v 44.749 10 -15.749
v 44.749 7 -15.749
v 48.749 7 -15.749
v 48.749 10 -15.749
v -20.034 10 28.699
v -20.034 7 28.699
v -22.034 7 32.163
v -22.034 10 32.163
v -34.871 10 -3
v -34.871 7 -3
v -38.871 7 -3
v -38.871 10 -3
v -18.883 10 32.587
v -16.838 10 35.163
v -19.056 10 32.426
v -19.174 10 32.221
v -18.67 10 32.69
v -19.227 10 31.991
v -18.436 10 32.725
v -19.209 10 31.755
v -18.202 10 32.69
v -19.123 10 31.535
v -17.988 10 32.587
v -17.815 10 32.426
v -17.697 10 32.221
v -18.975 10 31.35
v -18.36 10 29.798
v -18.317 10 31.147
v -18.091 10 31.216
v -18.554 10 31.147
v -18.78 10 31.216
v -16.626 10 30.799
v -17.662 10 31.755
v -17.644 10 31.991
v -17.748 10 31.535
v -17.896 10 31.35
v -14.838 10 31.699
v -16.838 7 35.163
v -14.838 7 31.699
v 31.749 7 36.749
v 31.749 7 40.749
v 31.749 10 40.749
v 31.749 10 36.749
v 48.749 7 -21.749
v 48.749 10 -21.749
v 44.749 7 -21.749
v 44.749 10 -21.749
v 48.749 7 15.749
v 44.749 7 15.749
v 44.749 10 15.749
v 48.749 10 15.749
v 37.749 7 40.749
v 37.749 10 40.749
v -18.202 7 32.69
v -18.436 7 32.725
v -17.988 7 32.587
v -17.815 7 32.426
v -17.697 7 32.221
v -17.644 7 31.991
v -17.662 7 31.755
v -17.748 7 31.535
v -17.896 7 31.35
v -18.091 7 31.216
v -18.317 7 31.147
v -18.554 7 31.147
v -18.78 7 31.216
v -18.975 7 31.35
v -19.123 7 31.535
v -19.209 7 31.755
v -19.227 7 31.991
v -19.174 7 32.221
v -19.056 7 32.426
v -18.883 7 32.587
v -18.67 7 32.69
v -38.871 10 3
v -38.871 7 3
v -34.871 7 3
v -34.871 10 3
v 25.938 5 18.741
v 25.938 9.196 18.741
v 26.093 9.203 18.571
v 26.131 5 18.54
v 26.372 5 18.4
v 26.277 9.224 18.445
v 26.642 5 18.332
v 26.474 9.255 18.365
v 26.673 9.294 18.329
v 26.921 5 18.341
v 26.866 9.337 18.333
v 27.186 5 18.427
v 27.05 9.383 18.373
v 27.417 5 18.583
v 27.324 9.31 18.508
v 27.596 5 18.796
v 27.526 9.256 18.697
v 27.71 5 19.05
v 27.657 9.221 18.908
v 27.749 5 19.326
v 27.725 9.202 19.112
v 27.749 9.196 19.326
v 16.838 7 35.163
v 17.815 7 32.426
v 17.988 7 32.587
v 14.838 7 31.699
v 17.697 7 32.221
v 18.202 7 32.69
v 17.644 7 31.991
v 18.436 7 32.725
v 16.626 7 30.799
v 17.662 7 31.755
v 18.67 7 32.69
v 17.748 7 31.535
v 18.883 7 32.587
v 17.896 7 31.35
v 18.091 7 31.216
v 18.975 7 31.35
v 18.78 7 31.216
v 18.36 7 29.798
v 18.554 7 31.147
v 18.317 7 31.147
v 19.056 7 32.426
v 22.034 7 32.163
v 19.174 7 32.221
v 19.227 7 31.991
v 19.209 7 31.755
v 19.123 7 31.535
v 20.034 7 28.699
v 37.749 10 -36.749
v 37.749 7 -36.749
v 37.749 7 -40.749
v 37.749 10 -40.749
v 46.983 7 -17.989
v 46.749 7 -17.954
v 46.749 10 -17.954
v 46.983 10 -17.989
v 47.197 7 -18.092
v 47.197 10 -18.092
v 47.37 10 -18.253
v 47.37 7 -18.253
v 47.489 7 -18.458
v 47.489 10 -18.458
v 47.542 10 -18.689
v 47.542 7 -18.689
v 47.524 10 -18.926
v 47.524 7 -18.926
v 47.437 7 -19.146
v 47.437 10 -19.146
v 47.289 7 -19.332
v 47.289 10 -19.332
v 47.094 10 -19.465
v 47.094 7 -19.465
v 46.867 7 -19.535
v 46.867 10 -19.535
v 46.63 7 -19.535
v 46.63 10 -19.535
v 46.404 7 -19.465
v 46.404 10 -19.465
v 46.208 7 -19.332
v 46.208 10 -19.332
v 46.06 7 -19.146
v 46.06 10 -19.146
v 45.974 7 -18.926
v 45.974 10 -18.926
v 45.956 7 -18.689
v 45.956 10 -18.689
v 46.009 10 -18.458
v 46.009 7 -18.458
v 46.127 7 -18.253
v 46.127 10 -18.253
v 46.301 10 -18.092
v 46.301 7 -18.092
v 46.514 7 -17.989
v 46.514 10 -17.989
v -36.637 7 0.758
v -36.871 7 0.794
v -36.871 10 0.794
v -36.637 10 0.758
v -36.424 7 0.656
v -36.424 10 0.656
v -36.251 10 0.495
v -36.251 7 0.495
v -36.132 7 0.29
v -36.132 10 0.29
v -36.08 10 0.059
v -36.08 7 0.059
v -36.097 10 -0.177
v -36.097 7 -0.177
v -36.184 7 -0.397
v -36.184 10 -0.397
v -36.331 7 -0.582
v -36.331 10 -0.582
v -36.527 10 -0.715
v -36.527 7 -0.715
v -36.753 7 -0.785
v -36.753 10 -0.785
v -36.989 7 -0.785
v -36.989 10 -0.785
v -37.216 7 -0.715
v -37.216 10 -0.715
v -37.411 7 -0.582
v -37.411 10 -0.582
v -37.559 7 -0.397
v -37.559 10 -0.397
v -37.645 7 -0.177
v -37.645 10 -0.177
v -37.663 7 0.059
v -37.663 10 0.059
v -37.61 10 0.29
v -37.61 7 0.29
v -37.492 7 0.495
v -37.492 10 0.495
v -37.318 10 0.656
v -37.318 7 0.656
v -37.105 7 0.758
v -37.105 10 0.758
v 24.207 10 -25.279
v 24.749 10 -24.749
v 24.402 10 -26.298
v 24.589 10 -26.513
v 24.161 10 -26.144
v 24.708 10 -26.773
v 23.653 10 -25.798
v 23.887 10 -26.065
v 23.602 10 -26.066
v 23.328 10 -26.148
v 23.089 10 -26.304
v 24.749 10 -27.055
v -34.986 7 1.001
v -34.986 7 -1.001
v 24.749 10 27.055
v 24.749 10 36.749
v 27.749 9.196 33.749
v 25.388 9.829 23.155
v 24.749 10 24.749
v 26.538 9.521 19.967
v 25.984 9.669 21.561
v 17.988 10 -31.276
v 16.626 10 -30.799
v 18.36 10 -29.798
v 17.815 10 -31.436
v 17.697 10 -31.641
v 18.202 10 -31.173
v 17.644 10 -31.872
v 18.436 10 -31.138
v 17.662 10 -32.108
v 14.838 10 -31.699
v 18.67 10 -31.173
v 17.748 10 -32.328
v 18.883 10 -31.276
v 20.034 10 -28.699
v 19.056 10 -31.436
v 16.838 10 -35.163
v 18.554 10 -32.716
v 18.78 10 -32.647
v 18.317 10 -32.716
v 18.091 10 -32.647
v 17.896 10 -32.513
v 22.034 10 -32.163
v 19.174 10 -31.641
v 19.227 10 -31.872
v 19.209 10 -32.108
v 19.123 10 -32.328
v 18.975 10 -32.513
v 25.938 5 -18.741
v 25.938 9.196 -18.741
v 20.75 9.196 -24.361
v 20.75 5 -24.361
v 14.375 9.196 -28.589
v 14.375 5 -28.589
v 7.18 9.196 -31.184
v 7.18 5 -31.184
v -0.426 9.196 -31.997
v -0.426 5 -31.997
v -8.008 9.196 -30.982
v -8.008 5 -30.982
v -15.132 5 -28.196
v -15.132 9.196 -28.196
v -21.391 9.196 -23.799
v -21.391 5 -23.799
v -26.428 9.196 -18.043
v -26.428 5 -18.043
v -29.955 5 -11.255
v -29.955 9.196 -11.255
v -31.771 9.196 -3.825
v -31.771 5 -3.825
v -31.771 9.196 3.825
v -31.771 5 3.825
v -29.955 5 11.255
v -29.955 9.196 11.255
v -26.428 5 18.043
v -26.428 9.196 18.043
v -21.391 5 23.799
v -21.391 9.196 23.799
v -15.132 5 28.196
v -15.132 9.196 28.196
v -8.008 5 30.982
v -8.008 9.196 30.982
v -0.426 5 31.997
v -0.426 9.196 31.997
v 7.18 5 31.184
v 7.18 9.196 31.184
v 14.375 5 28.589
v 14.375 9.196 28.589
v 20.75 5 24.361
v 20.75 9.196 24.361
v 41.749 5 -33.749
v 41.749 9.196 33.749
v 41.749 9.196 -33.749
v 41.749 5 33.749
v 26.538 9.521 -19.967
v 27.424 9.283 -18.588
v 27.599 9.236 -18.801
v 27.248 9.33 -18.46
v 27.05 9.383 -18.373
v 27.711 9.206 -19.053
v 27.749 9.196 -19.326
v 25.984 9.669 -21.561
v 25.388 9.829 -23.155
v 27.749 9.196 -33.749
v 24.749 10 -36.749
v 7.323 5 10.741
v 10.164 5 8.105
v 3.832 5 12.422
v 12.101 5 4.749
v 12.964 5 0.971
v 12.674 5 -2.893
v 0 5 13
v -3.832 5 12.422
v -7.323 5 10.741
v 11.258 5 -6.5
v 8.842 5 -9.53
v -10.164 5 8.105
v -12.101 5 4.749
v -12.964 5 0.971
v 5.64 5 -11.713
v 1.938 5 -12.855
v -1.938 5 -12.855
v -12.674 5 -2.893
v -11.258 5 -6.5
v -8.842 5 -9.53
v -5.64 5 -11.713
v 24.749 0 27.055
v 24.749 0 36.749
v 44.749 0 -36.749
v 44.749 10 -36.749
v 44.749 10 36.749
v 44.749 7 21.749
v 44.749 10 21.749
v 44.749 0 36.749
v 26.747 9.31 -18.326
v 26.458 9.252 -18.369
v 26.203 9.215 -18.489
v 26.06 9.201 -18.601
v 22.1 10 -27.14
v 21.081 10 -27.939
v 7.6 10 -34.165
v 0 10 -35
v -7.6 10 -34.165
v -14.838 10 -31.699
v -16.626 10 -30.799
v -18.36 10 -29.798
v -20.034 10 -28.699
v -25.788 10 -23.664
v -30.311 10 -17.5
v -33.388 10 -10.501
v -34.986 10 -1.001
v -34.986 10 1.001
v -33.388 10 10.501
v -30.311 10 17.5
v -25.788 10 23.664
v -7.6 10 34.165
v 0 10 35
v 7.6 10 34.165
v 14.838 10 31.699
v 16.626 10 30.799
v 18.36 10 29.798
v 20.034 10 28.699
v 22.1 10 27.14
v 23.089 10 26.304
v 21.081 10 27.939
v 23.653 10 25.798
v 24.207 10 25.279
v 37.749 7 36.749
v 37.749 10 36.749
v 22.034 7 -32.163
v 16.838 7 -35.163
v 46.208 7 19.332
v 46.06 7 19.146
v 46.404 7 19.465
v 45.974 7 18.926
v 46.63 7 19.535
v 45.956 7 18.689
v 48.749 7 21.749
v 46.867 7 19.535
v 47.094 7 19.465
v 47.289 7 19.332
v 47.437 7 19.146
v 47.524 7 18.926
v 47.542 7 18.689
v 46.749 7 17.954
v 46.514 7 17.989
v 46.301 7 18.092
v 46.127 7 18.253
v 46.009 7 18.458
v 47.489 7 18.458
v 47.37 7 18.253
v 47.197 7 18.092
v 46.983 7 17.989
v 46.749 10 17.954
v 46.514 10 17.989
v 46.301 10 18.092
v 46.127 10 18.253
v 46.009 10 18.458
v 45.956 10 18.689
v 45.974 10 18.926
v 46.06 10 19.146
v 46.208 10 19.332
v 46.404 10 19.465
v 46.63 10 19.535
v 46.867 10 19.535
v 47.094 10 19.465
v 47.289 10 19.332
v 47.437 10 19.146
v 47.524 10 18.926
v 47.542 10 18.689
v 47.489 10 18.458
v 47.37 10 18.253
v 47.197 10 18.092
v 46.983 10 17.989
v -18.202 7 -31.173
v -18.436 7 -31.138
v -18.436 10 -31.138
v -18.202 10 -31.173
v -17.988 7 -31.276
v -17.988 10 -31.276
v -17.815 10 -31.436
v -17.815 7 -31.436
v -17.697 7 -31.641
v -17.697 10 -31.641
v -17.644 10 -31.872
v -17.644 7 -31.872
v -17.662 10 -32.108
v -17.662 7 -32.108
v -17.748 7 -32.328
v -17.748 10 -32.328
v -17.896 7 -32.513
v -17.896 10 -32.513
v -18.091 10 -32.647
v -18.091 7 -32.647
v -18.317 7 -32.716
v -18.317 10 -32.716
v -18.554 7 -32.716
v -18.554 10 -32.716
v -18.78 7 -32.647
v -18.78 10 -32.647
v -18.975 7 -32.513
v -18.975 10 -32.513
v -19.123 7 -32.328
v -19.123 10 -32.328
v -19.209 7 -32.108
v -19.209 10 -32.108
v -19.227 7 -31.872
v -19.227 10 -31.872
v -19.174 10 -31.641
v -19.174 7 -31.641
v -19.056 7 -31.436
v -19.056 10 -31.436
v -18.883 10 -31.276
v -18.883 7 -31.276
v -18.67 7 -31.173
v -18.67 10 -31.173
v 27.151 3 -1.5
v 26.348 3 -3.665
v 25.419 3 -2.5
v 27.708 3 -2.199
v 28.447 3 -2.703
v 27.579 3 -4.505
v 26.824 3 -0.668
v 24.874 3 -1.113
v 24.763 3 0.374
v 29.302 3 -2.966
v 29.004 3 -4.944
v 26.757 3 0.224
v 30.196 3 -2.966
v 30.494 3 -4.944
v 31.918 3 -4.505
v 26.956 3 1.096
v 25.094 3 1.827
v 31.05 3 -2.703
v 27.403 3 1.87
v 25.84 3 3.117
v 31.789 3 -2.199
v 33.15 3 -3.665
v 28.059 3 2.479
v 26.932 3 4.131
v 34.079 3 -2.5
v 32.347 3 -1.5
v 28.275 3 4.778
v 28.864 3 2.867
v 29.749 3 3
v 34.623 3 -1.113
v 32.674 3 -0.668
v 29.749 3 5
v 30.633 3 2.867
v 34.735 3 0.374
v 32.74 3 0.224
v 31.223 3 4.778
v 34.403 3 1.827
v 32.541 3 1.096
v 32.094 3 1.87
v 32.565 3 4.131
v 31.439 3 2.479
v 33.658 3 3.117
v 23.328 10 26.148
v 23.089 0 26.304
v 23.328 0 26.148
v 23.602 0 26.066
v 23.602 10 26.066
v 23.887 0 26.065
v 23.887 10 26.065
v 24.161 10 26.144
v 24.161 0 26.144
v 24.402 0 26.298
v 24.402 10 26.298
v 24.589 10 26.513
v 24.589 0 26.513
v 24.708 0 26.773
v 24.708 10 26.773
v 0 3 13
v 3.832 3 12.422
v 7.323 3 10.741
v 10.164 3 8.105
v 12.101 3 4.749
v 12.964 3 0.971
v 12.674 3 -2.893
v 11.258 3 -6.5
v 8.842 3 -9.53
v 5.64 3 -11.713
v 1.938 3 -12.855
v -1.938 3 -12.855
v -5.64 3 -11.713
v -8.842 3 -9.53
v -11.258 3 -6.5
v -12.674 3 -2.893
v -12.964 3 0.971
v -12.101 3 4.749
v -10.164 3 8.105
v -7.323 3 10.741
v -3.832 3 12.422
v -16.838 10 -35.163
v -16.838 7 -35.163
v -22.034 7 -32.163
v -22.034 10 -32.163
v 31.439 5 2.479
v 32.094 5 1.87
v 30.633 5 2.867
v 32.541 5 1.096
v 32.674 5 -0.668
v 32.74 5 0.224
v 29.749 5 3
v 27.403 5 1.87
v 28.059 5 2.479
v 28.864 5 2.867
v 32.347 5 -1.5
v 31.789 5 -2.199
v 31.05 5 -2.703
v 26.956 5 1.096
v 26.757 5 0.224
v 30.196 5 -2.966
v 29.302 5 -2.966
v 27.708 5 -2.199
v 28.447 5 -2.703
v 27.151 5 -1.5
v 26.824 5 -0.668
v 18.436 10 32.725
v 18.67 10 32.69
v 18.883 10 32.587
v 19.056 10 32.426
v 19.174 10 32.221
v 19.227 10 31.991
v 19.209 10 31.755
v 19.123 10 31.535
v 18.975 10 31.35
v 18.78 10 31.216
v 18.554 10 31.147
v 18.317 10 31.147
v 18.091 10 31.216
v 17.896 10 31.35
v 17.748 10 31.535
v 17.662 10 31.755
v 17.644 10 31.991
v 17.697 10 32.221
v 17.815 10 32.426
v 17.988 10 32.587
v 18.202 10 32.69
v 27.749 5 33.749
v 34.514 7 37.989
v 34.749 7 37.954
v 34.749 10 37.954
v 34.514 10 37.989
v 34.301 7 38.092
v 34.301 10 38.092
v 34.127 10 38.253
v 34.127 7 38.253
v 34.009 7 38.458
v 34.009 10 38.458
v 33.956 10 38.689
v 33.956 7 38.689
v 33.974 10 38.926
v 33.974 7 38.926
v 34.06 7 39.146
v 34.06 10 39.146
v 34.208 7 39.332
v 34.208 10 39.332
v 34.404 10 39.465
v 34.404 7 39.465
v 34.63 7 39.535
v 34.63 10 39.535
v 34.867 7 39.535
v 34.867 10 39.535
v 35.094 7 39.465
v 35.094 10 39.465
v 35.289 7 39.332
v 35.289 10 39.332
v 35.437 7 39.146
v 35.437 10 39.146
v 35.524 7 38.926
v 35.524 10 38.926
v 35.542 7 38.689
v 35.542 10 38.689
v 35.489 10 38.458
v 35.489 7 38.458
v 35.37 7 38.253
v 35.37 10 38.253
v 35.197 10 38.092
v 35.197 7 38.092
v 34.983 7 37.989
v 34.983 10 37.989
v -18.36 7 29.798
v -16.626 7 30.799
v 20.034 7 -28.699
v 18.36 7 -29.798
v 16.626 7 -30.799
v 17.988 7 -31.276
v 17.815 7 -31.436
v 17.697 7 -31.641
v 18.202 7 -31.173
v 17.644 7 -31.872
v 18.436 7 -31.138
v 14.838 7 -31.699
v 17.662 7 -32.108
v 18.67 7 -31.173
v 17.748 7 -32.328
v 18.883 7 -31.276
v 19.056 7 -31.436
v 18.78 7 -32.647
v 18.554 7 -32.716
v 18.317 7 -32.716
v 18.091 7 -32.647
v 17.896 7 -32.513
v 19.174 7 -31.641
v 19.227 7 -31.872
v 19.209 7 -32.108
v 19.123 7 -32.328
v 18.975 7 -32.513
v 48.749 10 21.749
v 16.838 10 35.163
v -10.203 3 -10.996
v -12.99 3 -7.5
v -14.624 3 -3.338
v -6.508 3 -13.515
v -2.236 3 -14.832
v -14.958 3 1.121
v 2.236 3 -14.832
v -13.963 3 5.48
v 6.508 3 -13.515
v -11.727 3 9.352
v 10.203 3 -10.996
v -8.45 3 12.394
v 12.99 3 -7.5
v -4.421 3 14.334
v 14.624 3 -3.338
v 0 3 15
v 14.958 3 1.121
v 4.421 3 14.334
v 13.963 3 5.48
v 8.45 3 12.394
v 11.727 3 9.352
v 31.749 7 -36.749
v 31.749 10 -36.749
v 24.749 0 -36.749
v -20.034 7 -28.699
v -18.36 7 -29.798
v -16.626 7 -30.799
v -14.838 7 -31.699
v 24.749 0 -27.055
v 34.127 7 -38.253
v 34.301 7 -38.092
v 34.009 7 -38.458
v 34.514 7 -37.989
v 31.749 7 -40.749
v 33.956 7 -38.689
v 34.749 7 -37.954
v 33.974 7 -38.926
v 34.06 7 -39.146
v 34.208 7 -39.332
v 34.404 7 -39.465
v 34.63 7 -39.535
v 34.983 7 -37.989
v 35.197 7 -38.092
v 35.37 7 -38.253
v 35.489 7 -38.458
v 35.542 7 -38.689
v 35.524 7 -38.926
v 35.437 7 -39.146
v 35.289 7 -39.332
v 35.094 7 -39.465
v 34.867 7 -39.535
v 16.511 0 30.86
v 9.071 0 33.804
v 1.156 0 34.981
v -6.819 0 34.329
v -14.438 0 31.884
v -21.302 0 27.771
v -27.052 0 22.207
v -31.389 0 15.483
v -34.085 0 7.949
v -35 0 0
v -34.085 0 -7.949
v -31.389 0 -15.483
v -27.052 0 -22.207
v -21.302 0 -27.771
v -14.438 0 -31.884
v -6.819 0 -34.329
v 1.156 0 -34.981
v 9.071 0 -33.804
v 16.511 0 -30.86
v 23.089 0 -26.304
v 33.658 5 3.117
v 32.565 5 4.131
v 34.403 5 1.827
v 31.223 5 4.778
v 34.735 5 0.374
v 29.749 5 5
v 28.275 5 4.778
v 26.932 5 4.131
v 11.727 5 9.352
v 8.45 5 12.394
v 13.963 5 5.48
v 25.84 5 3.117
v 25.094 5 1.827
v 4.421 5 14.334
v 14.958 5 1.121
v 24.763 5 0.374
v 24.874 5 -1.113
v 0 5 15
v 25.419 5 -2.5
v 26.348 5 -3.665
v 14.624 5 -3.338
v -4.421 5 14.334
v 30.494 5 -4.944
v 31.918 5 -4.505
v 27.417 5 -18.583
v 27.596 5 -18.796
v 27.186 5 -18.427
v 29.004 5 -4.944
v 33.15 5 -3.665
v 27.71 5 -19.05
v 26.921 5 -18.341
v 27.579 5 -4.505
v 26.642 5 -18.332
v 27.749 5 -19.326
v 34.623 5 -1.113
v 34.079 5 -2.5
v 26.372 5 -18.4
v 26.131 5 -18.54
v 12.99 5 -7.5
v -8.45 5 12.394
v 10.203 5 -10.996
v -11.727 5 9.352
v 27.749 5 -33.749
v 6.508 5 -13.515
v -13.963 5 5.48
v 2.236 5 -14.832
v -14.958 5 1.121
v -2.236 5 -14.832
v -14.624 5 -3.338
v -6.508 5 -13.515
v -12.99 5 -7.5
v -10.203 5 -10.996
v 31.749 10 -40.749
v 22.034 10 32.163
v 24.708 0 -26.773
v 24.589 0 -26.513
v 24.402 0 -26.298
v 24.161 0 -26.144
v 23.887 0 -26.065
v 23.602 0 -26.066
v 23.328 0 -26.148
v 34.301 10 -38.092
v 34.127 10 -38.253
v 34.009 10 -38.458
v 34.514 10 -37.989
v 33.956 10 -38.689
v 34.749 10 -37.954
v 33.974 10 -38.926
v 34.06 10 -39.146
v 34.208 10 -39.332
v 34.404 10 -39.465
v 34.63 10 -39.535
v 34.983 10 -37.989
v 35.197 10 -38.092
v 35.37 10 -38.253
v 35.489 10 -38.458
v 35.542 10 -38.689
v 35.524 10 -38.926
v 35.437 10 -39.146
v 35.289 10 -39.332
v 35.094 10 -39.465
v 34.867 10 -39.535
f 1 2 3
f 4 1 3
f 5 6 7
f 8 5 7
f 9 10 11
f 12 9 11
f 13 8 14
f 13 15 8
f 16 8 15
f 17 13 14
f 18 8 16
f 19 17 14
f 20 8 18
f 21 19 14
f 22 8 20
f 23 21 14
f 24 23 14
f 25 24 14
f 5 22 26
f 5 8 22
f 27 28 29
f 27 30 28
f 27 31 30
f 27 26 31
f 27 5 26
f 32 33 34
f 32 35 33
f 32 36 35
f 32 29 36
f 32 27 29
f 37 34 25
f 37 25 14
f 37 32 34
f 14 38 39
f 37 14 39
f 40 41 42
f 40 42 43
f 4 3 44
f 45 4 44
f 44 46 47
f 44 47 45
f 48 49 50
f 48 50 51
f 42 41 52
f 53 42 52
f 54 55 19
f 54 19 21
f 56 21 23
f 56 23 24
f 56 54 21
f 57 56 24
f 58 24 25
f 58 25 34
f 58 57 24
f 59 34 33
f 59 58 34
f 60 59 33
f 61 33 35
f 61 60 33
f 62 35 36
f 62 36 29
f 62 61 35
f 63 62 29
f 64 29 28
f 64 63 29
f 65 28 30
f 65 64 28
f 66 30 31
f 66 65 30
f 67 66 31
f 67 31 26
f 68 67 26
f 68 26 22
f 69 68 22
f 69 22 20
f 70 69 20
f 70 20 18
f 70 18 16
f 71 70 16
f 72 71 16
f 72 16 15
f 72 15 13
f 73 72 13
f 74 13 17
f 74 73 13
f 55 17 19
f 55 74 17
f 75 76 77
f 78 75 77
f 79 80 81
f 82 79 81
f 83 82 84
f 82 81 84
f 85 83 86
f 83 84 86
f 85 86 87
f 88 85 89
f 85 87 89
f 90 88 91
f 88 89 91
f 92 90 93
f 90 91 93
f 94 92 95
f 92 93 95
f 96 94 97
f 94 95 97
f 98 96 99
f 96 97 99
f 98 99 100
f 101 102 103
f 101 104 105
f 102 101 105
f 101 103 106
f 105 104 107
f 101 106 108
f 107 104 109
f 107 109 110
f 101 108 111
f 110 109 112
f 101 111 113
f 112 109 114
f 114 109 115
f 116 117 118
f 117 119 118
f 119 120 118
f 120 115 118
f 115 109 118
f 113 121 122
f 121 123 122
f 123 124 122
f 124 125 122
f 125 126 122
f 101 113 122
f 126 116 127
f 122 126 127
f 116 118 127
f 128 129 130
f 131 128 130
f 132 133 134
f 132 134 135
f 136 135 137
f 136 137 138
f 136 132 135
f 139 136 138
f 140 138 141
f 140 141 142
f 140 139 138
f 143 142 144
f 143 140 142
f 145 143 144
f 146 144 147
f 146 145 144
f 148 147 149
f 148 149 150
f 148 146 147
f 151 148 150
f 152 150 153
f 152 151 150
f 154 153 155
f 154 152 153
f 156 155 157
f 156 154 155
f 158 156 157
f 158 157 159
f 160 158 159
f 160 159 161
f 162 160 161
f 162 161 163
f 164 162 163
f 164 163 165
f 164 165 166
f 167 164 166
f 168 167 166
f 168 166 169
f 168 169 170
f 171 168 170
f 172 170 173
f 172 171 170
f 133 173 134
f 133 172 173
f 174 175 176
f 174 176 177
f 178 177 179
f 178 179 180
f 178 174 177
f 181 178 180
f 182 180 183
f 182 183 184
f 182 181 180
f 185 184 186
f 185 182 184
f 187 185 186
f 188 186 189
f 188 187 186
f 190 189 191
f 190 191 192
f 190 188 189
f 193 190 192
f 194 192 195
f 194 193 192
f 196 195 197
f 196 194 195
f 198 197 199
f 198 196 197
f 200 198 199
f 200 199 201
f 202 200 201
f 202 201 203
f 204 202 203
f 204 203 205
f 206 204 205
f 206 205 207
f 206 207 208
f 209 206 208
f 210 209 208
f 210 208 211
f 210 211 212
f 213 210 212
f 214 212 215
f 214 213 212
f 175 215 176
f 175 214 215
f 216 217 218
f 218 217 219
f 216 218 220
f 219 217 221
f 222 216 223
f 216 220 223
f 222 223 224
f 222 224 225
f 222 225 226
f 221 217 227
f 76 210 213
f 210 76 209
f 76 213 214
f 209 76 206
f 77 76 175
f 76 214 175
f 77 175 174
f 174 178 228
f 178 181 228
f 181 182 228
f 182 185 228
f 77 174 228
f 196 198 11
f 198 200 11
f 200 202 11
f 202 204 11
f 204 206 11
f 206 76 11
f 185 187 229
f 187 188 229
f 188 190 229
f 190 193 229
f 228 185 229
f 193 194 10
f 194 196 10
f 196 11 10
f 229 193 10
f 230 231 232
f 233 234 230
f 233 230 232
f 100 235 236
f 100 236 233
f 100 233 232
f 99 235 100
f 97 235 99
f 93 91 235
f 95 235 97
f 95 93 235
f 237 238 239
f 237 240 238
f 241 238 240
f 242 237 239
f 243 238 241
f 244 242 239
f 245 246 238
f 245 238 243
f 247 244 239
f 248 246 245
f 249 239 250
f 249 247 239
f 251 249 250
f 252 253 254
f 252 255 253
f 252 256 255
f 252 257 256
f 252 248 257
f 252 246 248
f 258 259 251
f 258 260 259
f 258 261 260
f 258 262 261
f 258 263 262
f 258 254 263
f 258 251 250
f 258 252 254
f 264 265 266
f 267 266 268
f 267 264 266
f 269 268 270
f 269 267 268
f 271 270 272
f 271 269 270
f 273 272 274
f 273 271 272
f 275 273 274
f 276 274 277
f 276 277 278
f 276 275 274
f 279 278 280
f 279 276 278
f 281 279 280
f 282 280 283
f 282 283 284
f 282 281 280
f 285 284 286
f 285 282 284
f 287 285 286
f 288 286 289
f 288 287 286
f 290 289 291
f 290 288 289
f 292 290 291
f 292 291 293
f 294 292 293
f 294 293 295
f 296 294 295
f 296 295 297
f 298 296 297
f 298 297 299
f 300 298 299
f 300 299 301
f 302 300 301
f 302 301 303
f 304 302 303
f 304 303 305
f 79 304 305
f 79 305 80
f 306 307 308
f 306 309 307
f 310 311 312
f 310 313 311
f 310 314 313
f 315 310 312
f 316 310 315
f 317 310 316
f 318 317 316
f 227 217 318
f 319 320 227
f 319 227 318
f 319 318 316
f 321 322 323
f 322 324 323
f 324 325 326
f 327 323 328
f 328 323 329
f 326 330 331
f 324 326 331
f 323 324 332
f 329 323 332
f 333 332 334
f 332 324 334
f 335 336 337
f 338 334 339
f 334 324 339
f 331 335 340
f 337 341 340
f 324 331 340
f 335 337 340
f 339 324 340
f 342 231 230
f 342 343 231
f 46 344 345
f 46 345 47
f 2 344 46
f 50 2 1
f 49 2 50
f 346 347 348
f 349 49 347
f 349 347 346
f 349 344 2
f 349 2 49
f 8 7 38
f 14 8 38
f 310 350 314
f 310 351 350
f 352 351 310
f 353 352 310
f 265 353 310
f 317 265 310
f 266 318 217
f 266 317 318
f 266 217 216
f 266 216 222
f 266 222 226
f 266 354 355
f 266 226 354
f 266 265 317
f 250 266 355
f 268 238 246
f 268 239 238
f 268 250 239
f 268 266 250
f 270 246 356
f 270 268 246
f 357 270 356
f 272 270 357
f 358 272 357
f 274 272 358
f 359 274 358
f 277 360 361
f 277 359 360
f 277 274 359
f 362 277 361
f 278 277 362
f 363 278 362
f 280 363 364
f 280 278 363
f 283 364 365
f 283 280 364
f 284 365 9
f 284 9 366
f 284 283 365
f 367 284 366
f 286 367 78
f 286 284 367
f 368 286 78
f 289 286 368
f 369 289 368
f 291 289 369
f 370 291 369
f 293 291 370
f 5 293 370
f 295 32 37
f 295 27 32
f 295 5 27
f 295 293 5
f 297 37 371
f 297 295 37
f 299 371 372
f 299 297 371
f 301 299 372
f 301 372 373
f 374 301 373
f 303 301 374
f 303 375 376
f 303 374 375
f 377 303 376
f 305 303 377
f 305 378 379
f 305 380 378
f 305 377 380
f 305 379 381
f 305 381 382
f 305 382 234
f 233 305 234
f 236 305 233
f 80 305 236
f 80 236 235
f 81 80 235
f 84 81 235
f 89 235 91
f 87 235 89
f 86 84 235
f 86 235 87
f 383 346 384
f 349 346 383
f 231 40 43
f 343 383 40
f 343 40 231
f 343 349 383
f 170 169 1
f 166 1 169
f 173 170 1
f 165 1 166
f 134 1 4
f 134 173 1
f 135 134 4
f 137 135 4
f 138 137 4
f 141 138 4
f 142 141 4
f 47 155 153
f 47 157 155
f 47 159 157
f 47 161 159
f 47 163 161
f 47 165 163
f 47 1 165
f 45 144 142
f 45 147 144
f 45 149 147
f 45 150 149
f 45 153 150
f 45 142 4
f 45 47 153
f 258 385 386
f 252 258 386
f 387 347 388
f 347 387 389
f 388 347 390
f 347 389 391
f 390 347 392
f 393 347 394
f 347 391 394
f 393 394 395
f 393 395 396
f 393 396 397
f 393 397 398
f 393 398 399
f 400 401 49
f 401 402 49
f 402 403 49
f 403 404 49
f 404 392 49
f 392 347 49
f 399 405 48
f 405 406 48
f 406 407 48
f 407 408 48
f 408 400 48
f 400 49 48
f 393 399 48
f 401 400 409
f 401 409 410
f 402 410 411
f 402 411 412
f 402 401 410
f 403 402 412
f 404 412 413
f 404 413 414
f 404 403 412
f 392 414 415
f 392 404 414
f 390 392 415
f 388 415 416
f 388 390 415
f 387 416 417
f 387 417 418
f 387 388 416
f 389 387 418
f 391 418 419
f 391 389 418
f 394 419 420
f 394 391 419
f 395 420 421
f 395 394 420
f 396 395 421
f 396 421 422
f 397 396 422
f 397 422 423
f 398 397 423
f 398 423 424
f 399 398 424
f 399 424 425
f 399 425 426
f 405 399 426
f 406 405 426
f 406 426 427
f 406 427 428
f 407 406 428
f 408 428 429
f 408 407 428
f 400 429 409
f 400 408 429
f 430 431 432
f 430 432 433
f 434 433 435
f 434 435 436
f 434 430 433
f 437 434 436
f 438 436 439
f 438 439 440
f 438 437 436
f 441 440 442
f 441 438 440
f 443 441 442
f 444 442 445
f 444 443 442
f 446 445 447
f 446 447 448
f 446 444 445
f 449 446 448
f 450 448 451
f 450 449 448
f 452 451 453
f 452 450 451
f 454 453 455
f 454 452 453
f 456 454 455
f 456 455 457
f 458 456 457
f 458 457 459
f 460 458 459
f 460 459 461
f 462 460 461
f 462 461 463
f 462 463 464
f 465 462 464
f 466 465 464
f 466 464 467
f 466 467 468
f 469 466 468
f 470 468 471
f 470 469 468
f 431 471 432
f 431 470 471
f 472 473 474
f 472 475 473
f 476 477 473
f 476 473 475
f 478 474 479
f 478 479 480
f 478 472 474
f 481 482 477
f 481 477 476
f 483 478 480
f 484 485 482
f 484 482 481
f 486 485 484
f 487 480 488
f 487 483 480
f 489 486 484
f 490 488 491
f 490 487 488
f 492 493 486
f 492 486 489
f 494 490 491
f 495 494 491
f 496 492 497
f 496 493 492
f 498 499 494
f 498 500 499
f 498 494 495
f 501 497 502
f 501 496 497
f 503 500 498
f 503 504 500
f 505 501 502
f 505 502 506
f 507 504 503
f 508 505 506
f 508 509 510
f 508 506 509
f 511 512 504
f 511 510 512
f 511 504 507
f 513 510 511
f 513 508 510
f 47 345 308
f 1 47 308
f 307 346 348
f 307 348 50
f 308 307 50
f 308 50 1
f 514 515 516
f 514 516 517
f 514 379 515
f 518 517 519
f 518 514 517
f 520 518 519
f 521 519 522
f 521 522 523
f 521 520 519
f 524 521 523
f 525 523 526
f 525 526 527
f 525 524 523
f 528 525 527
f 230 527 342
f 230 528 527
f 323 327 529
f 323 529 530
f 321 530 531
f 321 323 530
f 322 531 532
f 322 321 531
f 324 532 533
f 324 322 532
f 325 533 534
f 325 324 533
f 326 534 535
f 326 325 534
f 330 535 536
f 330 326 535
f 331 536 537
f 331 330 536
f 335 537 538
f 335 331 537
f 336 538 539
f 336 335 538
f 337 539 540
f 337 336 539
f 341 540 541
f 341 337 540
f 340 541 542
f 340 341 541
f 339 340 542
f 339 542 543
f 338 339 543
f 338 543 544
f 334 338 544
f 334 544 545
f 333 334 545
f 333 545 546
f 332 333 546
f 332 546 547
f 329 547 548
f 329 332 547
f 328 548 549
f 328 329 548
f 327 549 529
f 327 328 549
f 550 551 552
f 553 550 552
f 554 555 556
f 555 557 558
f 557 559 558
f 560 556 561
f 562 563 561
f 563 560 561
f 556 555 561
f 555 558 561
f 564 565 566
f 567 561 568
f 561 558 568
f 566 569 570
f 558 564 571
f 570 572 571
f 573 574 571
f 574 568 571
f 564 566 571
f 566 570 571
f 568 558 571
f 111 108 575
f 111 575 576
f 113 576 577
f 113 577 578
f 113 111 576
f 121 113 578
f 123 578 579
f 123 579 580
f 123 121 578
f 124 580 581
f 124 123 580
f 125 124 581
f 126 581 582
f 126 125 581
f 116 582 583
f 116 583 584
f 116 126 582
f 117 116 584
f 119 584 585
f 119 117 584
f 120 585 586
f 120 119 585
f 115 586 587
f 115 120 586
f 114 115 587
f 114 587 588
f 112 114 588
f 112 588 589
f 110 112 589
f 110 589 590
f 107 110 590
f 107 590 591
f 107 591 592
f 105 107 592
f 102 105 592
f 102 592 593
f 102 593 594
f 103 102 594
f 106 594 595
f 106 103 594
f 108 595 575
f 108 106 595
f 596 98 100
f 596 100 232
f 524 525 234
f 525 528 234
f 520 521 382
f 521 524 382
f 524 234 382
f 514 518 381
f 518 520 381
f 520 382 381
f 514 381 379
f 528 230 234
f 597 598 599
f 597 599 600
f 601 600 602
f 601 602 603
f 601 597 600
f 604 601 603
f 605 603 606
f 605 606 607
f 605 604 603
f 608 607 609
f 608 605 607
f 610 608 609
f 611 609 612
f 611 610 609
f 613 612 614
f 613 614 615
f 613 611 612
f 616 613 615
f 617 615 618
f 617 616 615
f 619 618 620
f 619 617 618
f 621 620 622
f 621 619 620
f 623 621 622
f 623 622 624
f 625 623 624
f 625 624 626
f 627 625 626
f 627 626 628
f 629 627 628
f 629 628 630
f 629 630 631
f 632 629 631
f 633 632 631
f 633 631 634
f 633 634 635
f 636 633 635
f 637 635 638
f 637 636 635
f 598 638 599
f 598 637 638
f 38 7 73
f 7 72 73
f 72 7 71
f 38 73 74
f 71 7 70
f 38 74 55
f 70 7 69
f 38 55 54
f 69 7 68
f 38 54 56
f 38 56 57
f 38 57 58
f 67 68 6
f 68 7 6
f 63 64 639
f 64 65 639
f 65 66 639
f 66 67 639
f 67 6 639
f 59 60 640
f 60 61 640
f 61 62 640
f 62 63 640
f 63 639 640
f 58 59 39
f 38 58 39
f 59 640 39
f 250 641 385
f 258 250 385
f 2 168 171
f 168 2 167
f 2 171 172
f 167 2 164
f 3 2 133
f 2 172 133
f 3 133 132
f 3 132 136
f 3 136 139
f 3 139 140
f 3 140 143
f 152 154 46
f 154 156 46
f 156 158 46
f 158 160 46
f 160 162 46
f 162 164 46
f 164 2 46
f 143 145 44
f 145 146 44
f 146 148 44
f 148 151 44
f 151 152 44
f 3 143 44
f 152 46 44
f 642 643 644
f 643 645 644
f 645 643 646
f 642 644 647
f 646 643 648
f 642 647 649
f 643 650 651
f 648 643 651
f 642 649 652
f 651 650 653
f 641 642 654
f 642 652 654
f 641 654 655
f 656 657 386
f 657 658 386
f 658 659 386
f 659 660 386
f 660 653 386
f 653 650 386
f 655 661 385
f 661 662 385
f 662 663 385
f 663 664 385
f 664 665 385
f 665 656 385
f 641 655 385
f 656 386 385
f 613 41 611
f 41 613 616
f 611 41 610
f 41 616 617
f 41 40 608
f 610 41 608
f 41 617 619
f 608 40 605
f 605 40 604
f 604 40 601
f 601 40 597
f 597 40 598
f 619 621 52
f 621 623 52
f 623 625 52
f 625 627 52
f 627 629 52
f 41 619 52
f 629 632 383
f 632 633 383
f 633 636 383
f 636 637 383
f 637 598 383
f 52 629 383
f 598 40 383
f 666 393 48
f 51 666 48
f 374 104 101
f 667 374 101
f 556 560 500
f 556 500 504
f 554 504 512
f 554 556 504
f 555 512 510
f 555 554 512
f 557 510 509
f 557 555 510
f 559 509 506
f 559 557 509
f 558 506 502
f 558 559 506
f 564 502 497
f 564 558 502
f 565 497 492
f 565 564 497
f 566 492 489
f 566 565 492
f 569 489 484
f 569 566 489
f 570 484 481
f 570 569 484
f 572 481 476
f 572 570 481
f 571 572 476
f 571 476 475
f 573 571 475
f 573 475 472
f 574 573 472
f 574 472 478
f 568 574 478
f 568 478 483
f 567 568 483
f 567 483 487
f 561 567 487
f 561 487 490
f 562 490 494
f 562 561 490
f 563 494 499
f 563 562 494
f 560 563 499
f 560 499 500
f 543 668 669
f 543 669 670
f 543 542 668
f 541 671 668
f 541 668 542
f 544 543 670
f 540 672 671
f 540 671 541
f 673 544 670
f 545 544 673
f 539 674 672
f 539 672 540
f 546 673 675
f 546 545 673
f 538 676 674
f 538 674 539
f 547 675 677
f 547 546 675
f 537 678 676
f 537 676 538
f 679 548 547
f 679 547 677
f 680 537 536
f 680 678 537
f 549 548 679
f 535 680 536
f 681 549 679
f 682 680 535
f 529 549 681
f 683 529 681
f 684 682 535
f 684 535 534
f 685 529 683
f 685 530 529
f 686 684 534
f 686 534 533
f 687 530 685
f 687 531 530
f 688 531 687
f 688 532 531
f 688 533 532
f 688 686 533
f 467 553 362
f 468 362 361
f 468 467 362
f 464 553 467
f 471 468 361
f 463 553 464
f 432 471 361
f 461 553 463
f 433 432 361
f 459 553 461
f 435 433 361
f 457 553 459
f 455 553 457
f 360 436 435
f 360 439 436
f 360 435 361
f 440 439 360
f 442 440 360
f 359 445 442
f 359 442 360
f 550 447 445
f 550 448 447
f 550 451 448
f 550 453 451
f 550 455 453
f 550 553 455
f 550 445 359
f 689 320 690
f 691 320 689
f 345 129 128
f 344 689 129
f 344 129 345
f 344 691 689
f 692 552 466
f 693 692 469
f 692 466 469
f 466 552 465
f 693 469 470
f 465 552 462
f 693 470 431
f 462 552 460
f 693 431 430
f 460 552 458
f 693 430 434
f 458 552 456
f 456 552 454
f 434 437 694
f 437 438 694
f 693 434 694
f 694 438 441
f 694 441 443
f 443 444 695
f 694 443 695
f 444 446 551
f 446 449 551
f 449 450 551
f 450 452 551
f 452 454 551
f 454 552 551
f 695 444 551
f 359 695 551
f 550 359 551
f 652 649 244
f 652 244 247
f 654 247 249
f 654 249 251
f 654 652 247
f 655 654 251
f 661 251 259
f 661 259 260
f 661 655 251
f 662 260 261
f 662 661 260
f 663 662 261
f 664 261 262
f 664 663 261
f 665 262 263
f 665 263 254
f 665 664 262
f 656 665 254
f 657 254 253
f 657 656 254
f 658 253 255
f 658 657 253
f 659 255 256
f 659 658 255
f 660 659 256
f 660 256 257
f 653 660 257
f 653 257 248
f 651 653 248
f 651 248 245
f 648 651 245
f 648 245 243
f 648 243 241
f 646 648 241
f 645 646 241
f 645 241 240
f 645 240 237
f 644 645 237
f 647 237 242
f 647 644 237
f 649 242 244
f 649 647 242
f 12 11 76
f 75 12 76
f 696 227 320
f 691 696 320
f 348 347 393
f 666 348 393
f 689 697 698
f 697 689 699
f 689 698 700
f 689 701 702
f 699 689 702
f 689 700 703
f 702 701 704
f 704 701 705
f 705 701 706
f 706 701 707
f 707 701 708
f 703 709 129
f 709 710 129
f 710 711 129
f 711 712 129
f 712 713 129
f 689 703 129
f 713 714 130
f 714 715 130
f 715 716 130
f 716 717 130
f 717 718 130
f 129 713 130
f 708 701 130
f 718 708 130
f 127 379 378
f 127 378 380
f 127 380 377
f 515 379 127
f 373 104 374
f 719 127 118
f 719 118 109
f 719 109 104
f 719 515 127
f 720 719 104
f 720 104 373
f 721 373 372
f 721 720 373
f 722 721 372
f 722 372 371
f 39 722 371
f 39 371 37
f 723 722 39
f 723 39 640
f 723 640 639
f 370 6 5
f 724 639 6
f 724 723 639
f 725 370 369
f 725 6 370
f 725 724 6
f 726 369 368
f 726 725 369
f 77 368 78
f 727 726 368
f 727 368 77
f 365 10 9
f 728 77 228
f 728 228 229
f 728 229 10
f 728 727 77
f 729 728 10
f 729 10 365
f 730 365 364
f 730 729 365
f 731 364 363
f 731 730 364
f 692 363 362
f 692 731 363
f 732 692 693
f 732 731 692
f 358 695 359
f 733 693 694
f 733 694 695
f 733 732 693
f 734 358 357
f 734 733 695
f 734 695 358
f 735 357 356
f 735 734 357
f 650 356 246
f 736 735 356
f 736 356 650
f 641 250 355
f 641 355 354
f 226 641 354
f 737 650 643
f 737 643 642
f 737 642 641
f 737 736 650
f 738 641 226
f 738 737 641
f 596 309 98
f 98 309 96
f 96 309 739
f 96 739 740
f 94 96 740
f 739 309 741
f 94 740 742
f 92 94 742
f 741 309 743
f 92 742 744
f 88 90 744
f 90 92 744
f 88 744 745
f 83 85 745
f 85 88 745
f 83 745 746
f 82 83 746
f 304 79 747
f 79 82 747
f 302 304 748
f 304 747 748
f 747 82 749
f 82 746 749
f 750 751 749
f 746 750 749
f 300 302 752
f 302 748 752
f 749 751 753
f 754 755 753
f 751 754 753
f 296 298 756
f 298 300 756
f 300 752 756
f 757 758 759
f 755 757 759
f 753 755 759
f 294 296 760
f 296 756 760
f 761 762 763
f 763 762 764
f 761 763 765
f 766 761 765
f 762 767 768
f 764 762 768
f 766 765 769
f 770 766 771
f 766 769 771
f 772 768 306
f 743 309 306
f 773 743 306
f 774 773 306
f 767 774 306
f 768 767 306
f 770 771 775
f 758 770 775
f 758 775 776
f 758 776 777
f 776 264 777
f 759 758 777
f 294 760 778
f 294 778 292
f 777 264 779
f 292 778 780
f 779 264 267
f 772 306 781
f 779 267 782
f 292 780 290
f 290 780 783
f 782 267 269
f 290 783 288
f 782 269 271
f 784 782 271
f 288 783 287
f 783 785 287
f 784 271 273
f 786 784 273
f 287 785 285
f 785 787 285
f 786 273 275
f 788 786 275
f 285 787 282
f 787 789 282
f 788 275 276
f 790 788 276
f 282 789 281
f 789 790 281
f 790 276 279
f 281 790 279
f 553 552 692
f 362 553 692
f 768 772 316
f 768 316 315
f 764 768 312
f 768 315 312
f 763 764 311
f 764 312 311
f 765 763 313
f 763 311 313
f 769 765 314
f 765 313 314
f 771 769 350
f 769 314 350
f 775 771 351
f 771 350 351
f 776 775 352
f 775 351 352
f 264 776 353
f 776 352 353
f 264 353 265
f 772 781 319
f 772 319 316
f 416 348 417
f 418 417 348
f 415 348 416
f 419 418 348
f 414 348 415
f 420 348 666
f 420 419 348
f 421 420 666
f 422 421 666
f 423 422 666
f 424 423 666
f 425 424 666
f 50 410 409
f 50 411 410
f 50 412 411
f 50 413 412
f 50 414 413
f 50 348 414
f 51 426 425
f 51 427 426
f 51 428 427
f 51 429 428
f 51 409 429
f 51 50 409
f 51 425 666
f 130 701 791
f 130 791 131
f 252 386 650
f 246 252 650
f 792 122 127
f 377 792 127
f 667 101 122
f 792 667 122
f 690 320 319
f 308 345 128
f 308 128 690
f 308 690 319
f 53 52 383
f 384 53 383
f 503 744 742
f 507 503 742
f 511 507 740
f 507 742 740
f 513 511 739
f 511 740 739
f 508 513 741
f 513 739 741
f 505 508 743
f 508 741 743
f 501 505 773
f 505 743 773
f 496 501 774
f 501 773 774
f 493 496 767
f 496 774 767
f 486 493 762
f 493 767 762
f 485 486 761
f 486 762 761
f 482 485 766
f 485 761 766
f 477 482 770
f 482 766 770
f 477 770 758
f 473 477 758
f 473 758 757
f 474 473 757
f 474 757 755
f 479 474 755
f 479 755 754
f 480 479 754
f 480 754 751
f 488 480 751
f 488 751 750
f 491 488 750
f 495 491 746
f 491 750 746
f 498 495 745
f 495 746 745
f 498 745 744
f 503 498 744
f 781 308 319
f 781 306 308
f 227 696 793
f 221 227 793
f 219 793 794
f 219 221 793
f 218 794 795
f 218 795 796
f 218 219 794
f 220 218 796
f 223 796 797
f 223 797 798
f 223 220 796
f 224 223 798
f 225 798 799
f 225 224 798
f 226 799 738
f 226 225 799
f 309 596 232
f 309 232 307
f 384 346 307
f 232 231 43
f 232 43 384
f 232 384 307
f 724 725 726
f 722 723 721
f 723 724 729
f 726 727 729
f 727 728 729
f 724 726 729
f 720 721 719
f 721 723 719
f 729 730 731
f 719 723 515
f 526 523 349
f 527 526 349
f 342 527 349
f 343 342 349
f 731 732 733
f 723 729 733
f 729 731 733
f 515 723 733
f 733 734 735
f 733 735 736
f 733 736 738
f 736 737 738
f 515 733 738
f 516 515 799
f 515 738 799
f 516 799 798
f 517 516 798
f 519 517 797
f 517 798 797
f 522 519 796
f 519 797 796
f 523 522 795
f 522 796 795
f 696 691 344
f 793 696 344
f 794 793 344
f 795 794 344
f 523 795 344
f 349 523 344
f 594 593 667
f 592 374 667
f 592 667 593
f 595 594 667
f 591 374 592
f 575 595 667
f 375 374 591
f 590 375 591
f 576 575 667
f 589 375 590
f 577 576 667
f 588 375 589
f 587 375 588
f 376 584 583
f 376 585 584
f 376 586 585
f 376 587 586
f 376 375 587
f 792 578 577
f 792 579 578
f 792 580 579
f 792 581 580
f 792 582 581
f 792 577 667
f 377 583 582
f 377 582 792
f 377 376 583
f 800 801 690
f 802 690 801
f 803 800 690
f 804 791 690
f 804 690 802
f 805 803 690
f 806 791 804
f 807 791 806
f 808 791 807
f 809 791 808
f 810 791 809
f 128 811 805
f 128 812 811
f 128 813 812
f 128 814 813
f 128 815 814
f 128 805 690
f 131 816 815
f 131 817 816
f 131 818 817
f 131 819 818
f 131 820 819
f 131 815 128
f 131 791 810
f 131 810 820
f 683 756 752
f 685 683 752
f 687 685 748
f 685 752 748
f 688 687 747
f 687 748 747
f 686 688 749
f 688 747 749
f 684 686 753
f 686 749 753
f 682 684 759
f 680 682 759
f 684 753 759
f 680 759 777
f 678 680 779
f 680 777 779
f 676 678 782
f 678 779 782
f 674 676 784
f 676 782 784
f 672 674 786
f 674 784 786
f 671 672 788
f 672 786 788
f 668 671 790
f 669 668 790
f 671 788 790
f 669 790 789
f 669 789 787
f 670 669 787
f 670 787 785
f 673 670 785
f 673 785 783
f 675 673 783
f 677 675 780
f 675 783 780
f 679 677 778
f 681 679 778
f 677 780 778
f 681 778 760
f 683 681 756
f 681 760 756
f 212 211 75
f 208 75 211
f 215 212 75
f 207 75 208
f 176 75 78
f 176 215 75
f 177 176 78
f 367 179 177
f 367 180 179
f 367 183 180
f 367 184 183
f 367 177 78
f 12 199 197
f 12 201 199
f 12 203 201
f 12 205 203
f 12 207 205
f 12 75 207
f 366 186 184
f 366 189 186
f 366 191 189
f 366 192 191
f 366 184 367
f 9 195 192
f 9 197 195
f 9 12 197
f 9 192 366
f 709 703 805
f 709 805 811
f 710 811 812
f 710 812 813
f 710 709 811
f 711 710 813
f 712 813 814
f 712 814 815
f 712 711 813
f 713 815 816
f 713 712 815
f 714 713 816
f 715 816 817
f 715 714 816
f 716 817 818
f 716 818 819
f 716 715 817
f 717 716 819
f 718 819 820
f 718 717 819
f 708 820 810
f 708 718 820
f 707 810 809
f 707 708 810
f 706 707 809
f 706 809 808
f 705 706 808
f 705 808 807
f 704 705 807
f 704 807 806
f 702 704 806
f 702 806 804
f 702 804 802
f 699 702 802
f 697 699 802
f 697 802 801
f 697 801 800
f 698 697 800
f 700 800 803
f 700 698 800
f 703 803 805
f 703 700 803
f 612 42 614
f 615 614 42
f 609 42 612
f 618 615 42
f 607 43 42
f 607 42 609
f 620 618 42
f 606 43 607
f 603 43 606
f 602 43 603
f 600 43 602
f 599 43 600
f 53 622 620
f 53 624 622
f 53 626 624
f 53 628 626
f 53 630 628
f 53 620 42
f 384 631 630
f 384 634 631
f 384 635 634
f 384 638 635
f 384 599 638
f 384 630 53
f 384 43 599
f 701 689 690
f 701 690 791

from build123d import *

# Parameters (mm, degrees)
SKETCH1_R           = 15
BOSS_EXTRUDE1_DEPTH = 5
BOSS_EXTRUDE2_DEPTH = 5
FILLET2_R           = 1
CHAMFER12_SIZE      = 3
CHAMFER12_SIZE_2    = 0.803847577
BOSS_EXTRUDE3_START = -3
SKETCH5_R           = 0.79375
SKETCH5_W           = 6
SKETCH5_H           = 4
SKETCH5_R_2         = 0.795
SKETCH5_W_2         = 4
SKETCH5_H_2         = 6
BOSS_EXTRUDE3_DEPTH = 3
FILLET3_R           = 1
BOSS_EXTRUDE4_START = -5
SKETCH6_R           = 15
BOSS_EXTRUDE4_DEPTH = 5
SKETCH7_R           = 15
SKETCH7_R_2         = 13
SKETCH7_R_3         = 5
SKETCH7_R_4         = 3
CUT_EXTRUDE1_DEPTH  = 2


with BuildPart() as part:
    # Sketch1 → Boss-Extrude1 (new body)
    with BuildSketch(Plane(origin=(0, 0, 0), x_dir=(1, 0, 0), z_dir=(0, 1, 0))):
        with BuildLine():
            Line((24.748737342, 24.748737342), (24.748737342, 36.748737342))
            Line((24.748737342, 36.748737342), (44.748737342, 36.748737342))
            Line((44.748737342, 36.748737342), (44.748737342, -36.748737342))
            Line((44.748737342, -36.748737342), (24.748737342, -36.748737342))
            Line((24.748737342, -36.748737342), (24.748737342, -24.748737342))
            ThreePointArc((24.748737342, -24.748737342), (-35, 0), (24.748737342, 24.748737342))
        make_face()
        with Locations(Location((0, 0, 0), (0, 0, 270))):
            Circle(SKETCH1_R, mode=Mode.SUBTRACT)
    extrude(amount=BOSS_EXTRUDE1_DEPTH)

    # Sketch2 → Boss-Extrude2 (add)
    with BuildSketch(Plane(origin=(0, 5, 0), x_dir=(1, 0, 0), z_dir=(0, 1, 0))):
        with BuildLine():
            Line((24.748737342, 24.748737342), (24.748737342, 36.748737342))
            Line((24.748737342, 36.748737342), (44.748737342, 36.748737342))
            Line((44.748737342, 36.748737342), (44.748737342, -36.748737342))
            Line((44.748737342, -36.748737342), (24.748737342, -36.748737342))
            Line((24.748737342, -36.748737342), (24.748737342, -24.748737342))
            ThreePointArc((24.748737342, -24.748737342), (-35, 0), (24.748737342, 24.748737342))
        make_face()
        with BuildLine():
            Line((27.748737342, -15.937615127), (27.748737342, -33.748737342))
            Line((27.748737342, -33.748737342), (41.748737342, -33.748737342))
            Line((41.748737342, -33.748737342), (41.748737342, 33.748737342))
            Line((41.748737342, 33.748737342), (27.748737342, 33.748737342))
            Line((27.748737342, 33.748737342), (27.748737342, 15.937615127))
            ThreePointArc((27.748737342, 15.937615127), (-32, 0), (27.748737342, -15.937615127))
        make_face(mode=Mode.SUBTRACT)
    extrude(amount=BOSS_EXTRUDE2_DEPTH)

    # Fillet2
    fillet2_edges = [part.edges().sort_by_distance(p)[0] for p in [
        (24.748737342, 5, -24.748737342),
        (24.748737342, 5, 24.748737342),
    ]]
    fillet(fillet2_edges, radius=FILLET2_R)

    # Chamfer12
    # the kernel refuses this chamfer: 3, 0.803847577 mm, written as the material it takes off along each edge
    with BuildSketch(Plane(origin=(0, 10, 0), x_dir=(0.9619307815124764, 0, -0.27329319709571387), z_dir=(0.27329319709571387, 0, 0.9619307815124764))) as chamfer12_piece_1:
        Polygon((32 + CHAMFER12_SIZE, 0), (32, -CHAMFER12_SIZE_2), (32, 0), align=None)
    revolve(axis=Axis((0, 10, 0), (0, 1, 0)), revolution_arc=328.279348711, mode=Mode.SUBTRACT)
    with BuildSketch(Plane(origin=(27.748737342, 10, 8.147450417), x_dir=(-1, 0, 0), z_dir=(0, 0, 1)), Plane(origin=(27.748737342, 10, -33.748737342), x_dir=(-1, 0, 0), z_dir=(0, 0, 1))) as chamfer12_piece_2:
        Polygon((CHAMFER12_SIZE, 0), (0, CHAMFER12_SIZE_2), (0, 0), align=None)
    extrude(amount=25.601286925, mode=Mode.SUBTRACT)
    with BuildSketch(Plane(origin=(27.748737342, 10, 33.748737342), x_dir=(0, 0, 1), z_dir=(1, 0, 0)), Plane(origin=(41.748737342, 10, -33.748737342), x_dir=(0, 0, -1), z_dir=(-1, 0, 0))) as chamfer12_piece_3:
        Polygon((CHAMFER12_SIZE, 0), (0, CHAMFER12_SIZE_2), (0, 0), align=None)
    extrude(amount=14, mode=Mode.SUBTRACT)
    with BuildSketch(Plane(origin=(41.748737342, 10, 33.748737342), x_dir=(1, 0, 0), z_dir=(0, 0, -1))) as chamfer12_piece_4:
        Polygon((CHAMFER12_SIZE, 0), (0, CHAMFER12_SIZE_2), (0, 0), align=None)
    extrude(amount=67.497474683, mode=Mode.SUBTRACT)
    with BuildSketch(Plane(origin=(27.748737342, 10, 8.147450417), x_dir=(-1, 0, 0), z_dir=(0, 0, 1))) as chamfer12_piece_5a_section:
        Polygon((CHAMFER12_SIZE, 0), (0, CHAMFER12_SIZE_2), (0, 0), align=None)
    chamfer12_piece_5a = extrude(amount=33.391451635, mode=Mode.PRIVATE)
    chamfer12_piece_5a = split(chamfer12_piece_5a, bisect_by=Plane(origin=(27.748737342, 10, 36.748737342), z_dir=(0, 0, -1)), keep=Keep.TOP, mode=Mode.PRIVATE)
    chamfer12_piece_5a = split(chamfer12_piece_5a, bisect_by=Plane(origin=(27.748737342, 10, 33.748737342), z_dir=(0, 0, 1)), keep=Keep.TOP, mode=Mode.PRIVATE)
    with BuildSketch(Plane(origin=(19.958572631, 10, 33.748737342), x_dir=(0, 0, 1), z_dir=(1, 0, 0))) as chamfer12_piece_5b_section:
        Polygon((CHAMFER12_SIZE, 0), (0, CHAMFER12_SIZE_2), (0, 0), align=None)
    chamfer12_piece_5b = extrude(amount=21.790164711, mode=Mode.PRIVATE)
    chamfer12_piece_5b = split(chamfer12_piece_5b, bisect_by=Plane(origin=(24.748737342, 10, 33.748737342), z_dir=(1, 0, 0)), keep=Keep.TOP, mode=Mode.PRIVATE)
    chamfer12_piece_5b = split(chamfer12_piece_5b, bisect_by=Plane(origin=(27.748737342, 10, 33.748737342), z_dir=(-1, 0, 0)), keep=Keep.TOP, mode=Mode.PRIVATE)
    chamfer12_piece_5 = chamfer12_piece_5a & chamfer12_piece_5b
    add(chamfer12_piece_5, mode=Mode.SUBTRACT)
    with BuildSketch(Plane(origin=(27.748737342, 10, 33.748737342), x_dir=(0, 0, 1), z_dir=(1, 0, 0))) as chamfer12_piece_6a_section:
        Polygon((CHAMFER12_SIZE, 0), (0, CHAMFER12_SIZE_2), (0, 0), align=None)
    chamfer12_piece_6a = extrude(amount=21.790164711, mode=Mode.PRIVATE)
    chamfer12_piece_6a = split(chamfer12_piece_6a, bisect_by=Plane(origin=(44.748737342, 10, 33.748737342), z_dir=(-1, 0, 0)), keep=Keep.TOP, mode=Mode.PRIVATE)
    chamfer12_piece_6a = split(chamfer12_piece_6a, bisect_by=Plane(origin=(41.748737342, 10, 33.748737342), z_dir=(1, 0, 0)), keep=Keep.TOP, mode=Mode.PRIVATE)
    with BuildSketch(Plane(origin=(41.748737342, 10, 41.538902052), x_dir=(1, 0, 0), z_dir=(0, 0, -1))) as chamfer12_piece_6b_section:
        Polygon((CHAMFER12_SIZE, 0), (0, CHAMFER12_SIZE_2), (0, 0), align=None)
    chamfer12_piece_6b = extrude(amount=75.287639394, mode=Mode.PRIVATE)
    chamfer12_piece_6b = split(chamfer12_piece_6b, bisect_by=Plane(origin=(41.748737342, 10, 36.748737342), z_dir=(0, 0, -1)), keep=Keep.TOP, mode=Mode.PRIVATE)
    chamfer12_piece_6b = split(chamfer12_piece_6b, bisect_by=Plane(origin=(41.748737342, 10, 33.748737342), z_dir=(0, 0, 1)), keep=Keep.TOP, mode=Mode.PRIVATE)
    chamfer12_piece_6 = chamfer12_piece_6a & chamfer12_piece_6b
    add(chamfer12_piece_6, mode=Mode.SUBTRACT)
    with BuildSketch(Plane(origin=(41.748737342, 10, 33.748737342), x_dir=(1, 0, 0), z_dir=(0, 0, -1))) as chamfer12_piece_7a_section:
        Polygon((CHAMFER12_SIZE, 0), (0, CHAMFER12_SIZE_2), (0, 0), align=None)
    chamfer12_piece_7a = extrude(amount=75.287639394, mode=Mode.PRIVATE)
    chamfer12_piece_7a = split(chamfer12_piece_7a, bisect_by=Plane(origin=(41.748737342, 10, -36.748737342), z_dir=(0, 0, 1)), keep=Keep.TOP, mode=Mode.PRIVATE)
    chamfer12_piece_7a = split(chamfer12_piece_7a, bisect_by=Plane(origin=(41.748737342, 10, -33.748737342), z_dir=(0, 0, -1)), keep=Keep.TOP, mode=Mode.PRIVATE)
    with BuildSketch(Plane(origin=(49.538902052, 10, -33.748737342), x_dir=(0, 0, -1), z_dir=(-1, 0, 0))) as chamfer12_piece_7b_section:
        Polygon((CHAMFER12_SIZE, 0), (0, CHAMFER12_SIZE_2), (0, 0), align=None)
    chamfer12_piece_7b = extrude(amount=21.790164711, mode=Mode.PRIVATE)
    chamfer12_piece_7b = split(chamfer12_piece_7b, bisect_by=Plane(origin=(44.748737342, 10, -33.748737342), z_dir=(-1, 0, 0)), keep=Keep.TOP, mode=Mode.PRIVATE)
    chamfer12_piece_7b = split(chamfer12_piece_7b, bisect_by=Plane(origin=(41.748737342, 10, -33.748737342), z_dir=(1, 0, 0)), keep=Keep.TOP, mode=Mode.PRIVATE)
    chamfer12_piece_7 = chamfer12_piece_7a & chamfer12_piece_7b
    add(chamfer12_piece_7, mode=Mode.SUBTRACT)
    with BuildSketch(Plane(origin=(41.748737342, 10, -33.748737342), x_dir=(0, 0, -1), z_dir=(-1, 0, 0))) as chamfer12_piece_8a_section:
        Polygon((CHAMFER12_SIZE, 0), (0, CHAMFER12_SIZE_2), (0, 0), align=None)
    chamfer12_piece_8a = extrude(amount=21.790164711, mode=Mode.PRIVATE)
    chamfer12_piece_8a = split(chamfer12_piece_8a, bisect_by=Plane(origin=(24.748737342, 10, -33.748737342), z_dir=(1, 0, 0)), keep=Keep.TOP, mode=Mode.PRIVATE)
    chamfer12_piece_8a = split(chamfer12_piece_8a, bisect_by=Plane(origin=(27.748737342, 10, -33.748737342), z_dir=(-1, 0, 0)), keep=Keep.TOP, mode=Mode.PRIVATE)
    with BuildSketch(Plane(origin=(27.748737342, 10, -41.538902052), x_dir=(-1, 0, 0), z_dir=(0, 0, 1))) as chamfer12_piece_8b_section:
        Polygon((CHAMFER12_SIZE, 0), (0, CHAMFER12_SIZE_2), (0, 0), align=None)
    chamfer12_piece_8b = extrude(amount=33.391451635, mode=Mode.PRIVATE)
    chamfer12_piece_8b = split(chamfer12_piece_8b, bisect_by=Plane(origin=(27.748737342, 10, -36.748737342), z_dir=(0, 0, 1)), keep=Keep.TOP, mode=Mode.PRIVATE)
    chamfer12_piece_8b = split(chamfer12_piece_8b, bisect_by=Plane(origin=(27.748737342, 10, -33.748737342), z_dir=(0, 0, -1)), keep=Keep.TOP, mode=Mode.PRIVATE)
    chamfer12_piece_8 = chamfer12_piece_8a & chamfer12_piece_8b
    add(chamfer12_piece_8, mode=Mode.SUBTRACT)

    # Sketch5 → Boss-Extrude3 (add)
    # profile 1 of 9: a face of its own
    with BuildSketch(Plane(origin=(0, 10, 0), x_dir=(1, 0, 0), z_dir=(0, 1, 0)).offset(BOSS_EXTRUDE3_START)):
        with BuildLine():
            Line((-34.871191548, 3), (-38.871191548, 3))
            Line((-38.871191548, 3), (-38.871191548, -3))
            Line((-38.871191548, -3), (-34.871191548, -3))
            ThreePointArc((-34.871191548, -3), (-35, 0), (-34.871191548, 3))
        make_face()
        with Locations(Location((-36.871191548, 0, 0), (0, 0, 270))):
            Circle(SKETCH5_R, mode=Mode.SUBTRACT)
    # profile 2 of 9: a face of its own
    with BuildSketch(Plane(origin=(0, 10, 0), x_dir=(1, 0, 0), z_dir=(0, 1, 0)).offset(BOSS_EXTRUDE3_START)):
        with BuildLine():
            Line((-14.837519563, 31.699337741), (-16.837519563, 35.163439356))
            Line((-16.837519563, 35.163439356), (-22.033671986, 32.163439356))
            Line((-22.033671986, 32.163439356), (-20.033671986, 28.699337741))
            ThreePointArc((-20.033671986, 28.699337741), (-17.5, 30.310889132), (-14.837519563, 31.699337741))
        make_face()
        with Locations(Location((-18.435595774, 31.931388549, 0), (0, 0, 270))):
            Circle(SKETCH5_R, mode=Mode.SUBTRACT)
    # profile 3 of 9: a face of its own
    with BuildSketch(Plane(origin=(0, 10, 0), x_dir=(1, 0, 0), z_dir=(0, 1, 0)).offset(BOSS_EXTRUDE3_START)):
        with BuildLine():
            Line((20.033671986, 28.699337741), (22.033671986, 32.163439356))
            Line((22.033671986, 32.163439356), (16.837519563, 35.163439356))
            Line((16.837519563, 35.163439356), (14.837519563, 31.699337741))
            ThreePointArc((14.837519563, 31.699337741), (17.5, 30.310889132), (20.033671986, 28.699337741))
        make_face()
        with Locations(Location((18.435595774, 31.931388549, 0), (0, 0, 270))):
            Circle(SKETCH5_R, mode=Mode.SUBTRACT)
    # profile 4 of 9: a face of its own
    with BuildSketch(Plane(origin=(0, 10, 0), x_dir=(1, 0, 0), z_dir=(0, 1, 0)).offset(BOSS_EXTRUDE3_START)):
        with BuildLine():
            Line((14.837519563, -31.699337741), (16.837519563, -35.163439356))
            Line((16.837519563, -35.163439356), (22.033671986, -32.163439356))
            Line((22.033671986, -32.163439356), (20.033671986, -28.699337741))
            ThreePointArc((20.033671986, -28.699337741), (17.5, -30.310889132), (14.837519563, -31.699337741))
        make_face()
        with Locations(Location((18.435595774, -31.931388549, 0), (0, 0, 270))):
            Circle(SKETCH5_R, mode=Mode.SUBTRACT)
    # profile 5 of 9: a face of its own
    with BuildSketch(Plane(origin=(0, 10, 0), x_dir=(1, 0, 0), z_dir=(0, 1, 0)).offset(BOSS_EXTRUDE3_START)):
        with BuildLine():
            Line((-20.033671986, -28.699337741), (-22.033671986, -32.163439356))
            Line((-22.033671986, -32.163439356), (-16.837519563, -35.163439356))
            Line((-16.837519563, -35.163439356), (-14.837519563, -31.699337741))
            ThreePointArc((-14.837519563, -31.699337741), (-17.5, -30.310889132), (-20.033671986, -28.699337741))
        make_face()
        with Locations(Location((-18.435595774, -31.931388549, 0), (0, 0, 270))):
            Circle(SKETCH5_R, mode=Mode.SUBTRACT)
    # profile 6 of 9: a face of its own
    with BuildSketch(Plane(origin=(0, 10, 0), x_dir=(1, 0, 0), z_dir=(0, 1, 0)).offset(BOSS_EXTRUDE3_START)):
        with Locations((34.748737342, 38.748737342)):
            Rectangle(SKETCH5_W, SKETCH5_H)
        with Locations(Location((34.748737342, 38.748737342, 0), (0, 0, 270))):
            Circle(SKETCH5_R_2, mode=Mode.SUBTRACT)
    # profile 7 of 9: a face of its own
    with BuildSketch(Plane(origin=(0, 10, 0), x_dir=(1, 0, 0), z_dir=(0, 1, 0)).offset(BOSS_EXTRUDE3_START)):
        with Locations((46.748737342, 18.748737342)):
            Rectangle(SKETCH5_W_2, SKETCH5_H_2)
        with Locations(Location((46.748737342, 18.748737342, 0), (0, 0, 270))):
            Circle(SKETCH5_R_2, mode=Mode.SUBTRACT)
    # profile 8 of 9: a face of its own
    with BuildSketch(Plane(origin=(0, 10, 0), x_dir=(1, 0, 0), z_dir=(0, 1, 0)).offset(BOSS_EXTRUDE3_START)):
        with Locations((46.748737342, -18.748737342)):
            Rectangle(SKETCH5_W_2, SKETCH5_H_2)
        with Locations(Location((46.748737342, -18.748737342, 0), (0, 0, 90))):
            Circle(SKETCH5_R_2, mode=Mode.SUBTRACT)
    # profile 9 of 9: a face of its own
    with BuildSketch(Plane(origin=(0, 10, 0), x_dir=(1, 0, 0), z_dir=(0, 1, 0)).offset(BOSS_EXTRUDE3_START)):
        with Locations((34.748737342, -38.748737342)):
            Rectangle(SKETCH5_W, SKETCH5_H)
        with Locations(Location((34.748737342, -38.748737342, 0), (0, 0, 90))):
            Circle(SKETCH5_R_2, mode=Mode.SUBTRACT)
    extrude(amount=BOSS_EXTRUDE3_DEPTH)

    # Fillet3
    fillet3_edges = [part.edges().sort_by_distance(p)[0] for p in [
        (27.748737342, 7.098076212, 15.937615127),
        (27.748737342, 7.098076212, -15.937615127),
    ]]
    fillet(fillet3_edges, radius=FILLET3_R)

    # Sketch6 → Boss-Extrude4 (add)
    with BuildSketch(Plane(origin=(0, 5, 0), x_dir=(1, 0, 0), z_dir=(0, 1, 0)).offset(BOSS_EXTRUDE4_START)):
        Circle(SKETCH6_R)
    extrude(amount=BOSS_EXTRUDE4_DEPTH)

    # Sketch7 → Cut-Extrude1 (cut)
    # profile 1 of 2: a face of its own
    with BuildSketch(Plane(origin=(0, 5, 0), x_dir=(1, 0, 0), z_dir=(0, 1, 0))):
        with Locations(Location((0, 0, 0), (0, 0, 270))):
            Circle(SKETCH7_R)
        with Locations(Location((0, 0, 0), (0, 0, 270))):
            Circle(SKETCH7_R_2, mode=Mode.SUBTRACT)
    # profile 2 of 2: a face of its own
    with BuildSketch(Plane(origin=(0, 5, 0), x_dir=(1, 0, 0), z_dir=(0, 1, 0))):
        with Locations(Location((29.748737342, 0, 0), (0, 0, 270))):
            Circle(SKETCH7_R_3)
        with Locations(Location((29.748737342, 0, 0), (0, 0, 270))):
            Circle(SKETCH7_R_4, mode=Mode.SUBTRACT)
    extrude(amount=-CUT_EXTRUDE1_DEPTH, mode=Mode.SUBTRACT)


solid = part.part
